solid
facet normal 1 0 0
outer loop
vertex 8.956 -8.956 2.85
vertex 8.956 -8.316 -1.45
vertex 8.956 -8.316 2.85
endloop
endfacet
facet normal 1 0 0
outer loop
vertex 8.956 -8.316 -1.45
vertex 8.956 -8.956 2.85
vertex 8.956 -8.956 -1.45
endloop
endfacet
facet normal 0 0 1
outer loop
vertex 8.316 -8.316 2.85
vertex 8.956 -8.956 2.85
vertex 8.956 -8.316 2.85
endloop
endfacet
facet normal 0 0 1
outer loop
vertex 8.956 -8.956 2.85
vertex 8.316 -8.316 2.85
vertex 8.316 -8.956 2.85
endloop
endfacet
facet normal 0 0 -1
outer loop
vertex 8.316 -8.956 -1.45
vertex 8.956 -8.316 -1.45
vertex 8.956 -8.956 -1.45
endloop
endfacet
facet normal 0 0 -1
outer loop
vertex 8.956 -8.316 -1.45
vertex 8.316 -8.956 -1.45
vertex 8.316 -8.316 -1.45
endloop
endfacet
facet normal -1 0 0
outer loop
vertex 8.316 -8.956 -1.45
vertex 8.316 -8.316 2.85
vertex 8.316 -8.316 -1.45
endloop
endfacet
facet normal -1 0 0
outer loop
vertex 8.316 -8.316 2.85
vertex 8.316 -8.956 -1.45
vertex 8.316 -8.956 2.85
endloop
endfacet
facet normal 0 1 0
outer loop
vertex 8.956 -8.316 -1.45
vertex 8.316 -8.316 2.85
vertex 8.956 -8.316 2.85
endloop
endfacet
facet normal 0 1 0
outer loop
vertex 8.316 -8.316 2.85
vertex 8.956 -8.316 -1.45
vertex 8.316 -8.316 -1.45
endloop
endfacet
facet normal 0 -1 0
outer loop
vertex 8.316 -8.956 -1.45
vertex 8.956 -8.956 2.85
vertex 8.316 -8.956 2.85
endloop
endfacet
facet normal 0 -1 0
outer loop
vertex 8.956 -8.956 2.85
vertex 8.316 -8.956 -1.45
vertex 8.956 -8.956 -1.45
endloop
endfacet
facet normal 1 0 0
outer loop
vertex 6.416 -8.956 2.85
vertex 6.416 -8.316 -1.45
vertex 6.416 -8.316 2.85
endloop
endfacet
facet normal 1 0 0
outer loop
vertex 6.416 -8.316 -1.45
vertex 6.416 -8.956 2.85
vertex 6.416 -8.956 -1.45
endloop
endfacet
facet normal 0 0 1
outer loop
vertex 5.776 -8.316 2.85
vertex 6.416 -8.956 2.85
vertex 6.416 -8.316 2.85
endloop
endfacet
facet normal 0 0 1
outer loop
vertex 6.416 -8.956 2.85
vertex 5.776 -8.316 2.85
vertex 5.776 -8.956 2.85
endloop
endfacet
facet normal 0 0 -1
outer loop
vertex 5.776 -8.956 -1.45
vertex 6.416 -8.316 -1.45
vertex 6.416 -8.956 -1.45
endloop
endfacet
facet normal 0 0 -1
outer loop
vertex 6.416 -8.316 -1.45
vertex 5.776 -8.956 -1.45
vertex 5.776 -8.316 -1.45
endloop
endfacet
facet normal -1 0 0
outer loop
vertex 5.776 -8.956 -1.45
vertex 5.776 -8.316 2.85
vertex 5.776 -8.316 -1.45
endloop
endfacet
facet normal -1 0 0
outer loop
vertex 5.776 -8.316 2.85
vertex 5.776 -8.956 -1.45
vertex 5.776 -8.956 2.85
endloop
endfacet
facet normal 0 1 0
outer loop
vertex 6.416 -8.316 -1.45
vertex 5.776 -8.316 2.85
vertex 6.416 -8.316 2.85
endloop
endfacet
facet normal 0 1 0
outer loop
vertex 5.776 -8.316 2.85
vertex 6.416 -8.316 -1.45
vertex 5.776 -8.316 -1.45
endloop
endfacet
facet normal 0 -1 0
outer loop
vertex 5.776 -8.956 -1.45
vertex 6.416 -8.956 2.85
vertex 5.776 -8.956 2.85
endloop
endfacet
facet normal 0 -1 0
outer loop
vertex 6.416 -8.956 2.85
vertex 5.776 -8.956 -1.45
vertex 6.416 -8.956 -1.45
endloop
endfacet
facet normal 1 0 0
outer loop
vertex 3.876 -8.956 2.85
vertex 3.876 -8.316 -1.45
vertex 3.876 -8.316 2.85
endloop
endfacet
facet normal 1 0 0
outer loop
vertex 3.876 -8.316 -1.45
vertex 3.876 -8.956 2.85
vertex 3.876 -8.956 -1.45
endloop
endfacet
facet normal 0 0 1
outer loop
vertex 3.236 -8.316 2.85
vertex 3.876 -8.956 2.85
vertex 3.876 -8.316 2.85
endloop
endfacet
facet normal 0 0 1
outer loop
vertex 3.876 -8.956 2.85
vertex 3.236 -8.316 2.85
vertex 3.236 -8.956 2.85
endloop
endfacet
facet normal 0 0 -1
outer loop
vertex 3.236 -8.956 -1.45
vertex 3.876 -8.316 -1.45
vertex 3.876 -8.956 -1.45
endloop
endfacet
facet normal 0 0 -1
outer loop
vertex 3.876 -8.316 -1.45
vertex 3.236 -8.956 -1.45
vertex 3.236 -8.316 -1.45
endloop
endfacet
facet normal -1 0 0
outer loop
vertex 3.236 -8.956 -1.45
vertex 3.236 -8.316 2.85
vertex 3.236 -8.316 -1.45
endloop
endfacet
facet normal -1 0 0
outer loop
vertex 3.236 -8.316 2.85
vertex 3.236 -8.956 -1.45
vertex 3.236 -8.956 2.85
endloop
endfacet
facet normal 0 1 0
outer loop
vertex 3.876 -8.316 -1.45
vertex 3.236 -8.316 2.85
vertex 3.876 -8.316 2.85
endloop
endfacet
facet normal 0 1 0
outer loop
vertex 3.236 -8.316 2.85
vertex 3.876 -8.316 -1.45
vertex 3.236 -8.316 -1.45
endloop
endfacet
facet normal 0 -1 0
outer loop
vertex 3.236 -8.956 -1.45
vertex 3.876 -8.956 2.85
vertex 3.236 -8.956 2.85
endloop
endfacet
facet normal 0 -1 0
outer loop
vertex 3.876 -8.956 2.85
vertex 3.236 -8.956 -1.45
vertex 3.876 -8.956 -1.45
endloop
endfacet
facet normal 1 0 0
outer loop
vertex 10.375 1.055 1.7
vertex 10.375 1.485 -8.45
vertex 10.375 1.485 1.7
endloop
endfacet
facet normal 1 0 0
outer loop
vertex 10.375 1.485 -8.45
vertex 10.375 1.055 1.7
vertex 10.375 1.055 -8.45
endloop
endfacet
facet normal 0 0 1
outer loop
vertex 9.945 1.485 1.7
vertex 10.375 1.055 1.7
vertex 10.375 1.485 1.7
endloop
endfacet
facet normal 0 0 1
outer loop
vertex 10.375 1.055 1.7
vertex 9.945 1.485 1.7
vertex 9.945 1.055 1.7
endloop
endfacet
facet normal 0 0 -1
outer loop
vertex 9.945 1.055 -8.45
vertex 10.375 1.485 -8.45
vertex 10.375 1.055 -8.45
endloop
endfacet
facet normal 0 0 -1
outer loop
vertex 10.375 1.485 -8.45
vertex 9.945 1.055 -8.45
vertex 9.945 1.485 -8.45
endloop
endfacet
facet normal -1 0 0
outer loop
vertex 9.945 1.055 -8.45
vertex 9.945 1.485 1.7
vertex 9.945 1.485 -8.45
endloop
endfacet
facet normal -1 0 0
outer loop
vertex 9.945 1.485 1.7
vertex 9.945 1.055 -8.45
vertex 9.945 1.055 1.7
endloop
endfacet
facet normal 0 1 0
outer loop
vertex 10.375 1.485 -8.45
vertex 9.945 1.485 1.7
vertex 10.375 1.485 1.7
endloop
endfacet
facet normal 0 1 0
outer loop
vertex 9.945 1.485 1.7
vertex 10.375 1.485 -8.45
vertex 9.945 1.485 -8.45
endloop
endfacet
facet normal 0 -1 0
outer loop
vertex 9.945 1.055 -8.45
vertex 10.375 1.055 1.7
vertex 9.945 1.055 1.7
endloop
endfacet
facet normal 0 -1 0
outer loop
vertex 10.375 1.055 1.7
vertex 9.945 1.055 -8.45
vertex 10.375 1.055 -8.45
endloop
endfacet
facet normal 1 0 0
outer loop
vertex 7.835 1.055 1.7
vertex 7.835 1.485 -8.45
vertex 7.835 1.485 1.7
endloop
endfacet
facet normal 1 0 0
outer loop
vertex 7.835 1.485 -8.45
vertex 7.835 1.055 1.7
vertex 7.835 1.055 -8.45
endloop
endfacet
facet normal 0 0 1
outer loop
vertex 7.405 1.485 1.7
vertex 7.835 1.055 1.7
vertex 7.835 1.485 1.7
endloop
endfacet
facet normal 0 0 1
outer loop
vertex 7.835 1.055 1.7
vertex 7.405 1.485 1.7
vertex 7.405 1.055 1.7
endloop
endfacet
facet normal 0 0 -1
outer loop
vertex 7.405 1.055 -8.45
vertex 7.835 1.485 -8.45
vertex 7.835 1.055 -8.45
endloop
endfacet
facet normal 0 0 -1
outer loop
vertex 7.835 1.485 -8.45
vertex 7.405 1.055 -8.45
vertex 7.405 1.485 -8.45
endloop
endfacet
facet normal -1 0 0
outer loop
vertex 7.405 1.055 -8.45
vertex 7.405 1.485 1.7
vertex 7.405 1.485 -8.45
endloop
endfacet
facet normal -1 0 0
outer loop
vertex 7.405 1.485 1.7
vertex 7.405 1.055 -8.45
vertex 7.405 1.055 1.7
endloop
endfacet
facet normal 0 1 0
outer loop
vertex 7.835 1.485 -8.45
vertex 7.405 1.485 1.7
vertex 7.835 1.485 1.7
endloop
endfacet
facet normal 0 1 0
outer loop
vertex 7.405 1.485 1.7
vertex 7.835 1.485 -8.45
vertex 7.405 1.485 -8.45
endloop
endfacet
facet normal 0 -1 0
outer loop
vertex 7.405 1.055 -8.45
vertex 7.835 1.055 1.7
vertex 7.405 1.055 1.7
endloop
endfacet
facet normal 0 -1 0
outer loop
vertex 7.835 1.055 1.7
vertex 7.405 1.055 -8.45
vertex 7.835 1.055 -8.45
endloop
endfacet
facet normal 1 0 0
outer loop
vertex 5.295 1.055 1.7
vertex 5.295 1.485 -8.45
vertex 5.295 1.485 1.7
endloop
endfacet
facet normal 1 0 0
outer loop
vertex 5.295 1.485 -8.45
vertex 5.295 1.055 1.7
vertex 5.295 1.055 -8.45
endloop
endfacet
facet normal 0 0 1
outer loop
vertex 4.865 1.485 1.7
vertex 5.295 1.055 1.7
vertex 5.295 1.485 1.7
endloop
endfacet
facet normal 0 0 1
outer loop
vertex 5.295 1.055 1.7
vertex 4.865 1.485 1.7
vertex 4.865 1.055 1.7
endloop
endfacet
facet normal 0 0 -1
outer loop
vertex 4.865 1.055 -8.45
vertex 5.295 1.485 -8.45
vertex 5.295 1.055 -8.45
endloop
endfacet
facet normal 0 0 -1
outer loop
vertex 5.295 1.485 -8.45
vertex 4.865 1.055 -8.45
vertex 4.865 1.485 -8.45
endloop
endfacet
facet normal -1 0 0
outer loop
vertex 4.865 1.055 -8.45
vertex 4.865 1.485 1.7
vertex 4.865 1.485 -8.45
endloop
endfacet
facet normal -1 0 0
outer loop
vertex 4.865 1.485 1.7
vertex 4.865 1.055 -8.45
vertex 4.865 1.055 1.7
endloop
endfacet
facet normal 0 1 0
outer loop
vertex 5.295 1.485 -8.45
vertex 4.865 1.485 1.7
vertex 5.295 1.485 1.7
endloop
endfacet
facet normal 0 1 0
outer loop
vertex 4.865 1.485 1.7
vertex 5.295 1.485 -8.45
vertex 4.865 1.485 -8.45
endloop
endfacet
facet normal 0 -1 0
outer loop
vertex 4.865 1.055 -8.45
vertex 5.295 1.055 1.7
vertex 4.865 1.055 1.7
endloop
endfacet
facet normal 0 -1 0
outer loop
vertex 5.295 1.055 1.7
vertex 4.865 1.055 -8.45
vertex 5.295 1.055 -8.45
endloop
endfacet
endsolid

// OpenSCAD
// file: 801f8c8ad5252d830007bc8fb8f76d3168990c0b1102200be74383be07b724a8.scad
/*
   Copyright 2018 Scott Bezek and the splitflap contributors

   Licensed under the Apache License, Version 2.0 (the "License");
   you may not use this file except in compliance with the License.
   You may obtain a copy of the License at

       http://www.apache.org/licenses/LICENSE-2.0

   Unless required by applicable law or agreed to in writing, software
   distributed under the License is distributed on an "AS IS" BASIS,
   WITHOUT WARRANTIES OR CONDITIONS OF ANY KIND, either express or implied.
   See the License for the specific language governing permissions and
   limitations under the License.
*/

include <3a8aa1ee2c5f15af7c9a4d3d95d6786cd3b11c8e1af2661494beaac4b8dd79fa.scad>;

pcb_thickness = 1.6;
sensor_spool_distance = 0.70;  // distance from the sensor to the face of the spool

// From datasheet:
hall_effect_height = (2.8 + 3.2) / 2;
hall_effect_width = (3.9 + 4.3) / 2;
hall_effect_thickness = (1.40 + 1.60) / 2;
hall_effect_sensor_offset_y = hall_effect_height - 1.25;
hall_effect_pin_length_max = 14.5;

// From sensor.kicad_pcb:
pcb_height = 16.256;
pcb_length = 16.256;
pcb_hole_to_sensor_pin_1_x = 10.16;
pcb_hole_to_sensor_pin_1_y = 1.27;
sensor_pin_pitch = 2.54;
pcb_hole_to_connector_pin_1_x = 8.636;
pcb_hole_to_connector_pin_1_y = 8.636;
connector_pin_pitch = 2.54;
pcb_edge_to_hole_x = 4.572;
pcb_edge_to_hole_y = 4.572;

pcb_adjustment_range = 4;
pcb_hole_radius = m4_hole_diameter/2;

// Jig dimensions
pcb_jig_corner_fillet = 2;
pcb_jig_align_thickness = 2;
pcb_jig_align_length = 0;  // past the PCB thickness
pcb_jig_align_clearance = 0.25;  // on x, around the PCB
pcb_jig_depth_clearance = 0.1;  // on y, from sensor to jig


// Computed dimensions
pcb_hole_to_sensor_x = pcb_hole_to_sensor_pin_1_x - sensor_pin_pitch;
pcb_hole_to_sensor_y = pcb_hole_to_sensor_pin_1_y + hall_effect_sensor_offset_y;


// Rough numbers for 3d rendering only (non-critical dimensions)
pcb_connector_height = 3.2;
pcb_connector_width = 8.2;
pcb_connector_length = 18;
pcb_connector_pin_width = 0.64;
pcb_connector_pin_slop = 0.4;
pcb_connector_pin_tail_length = 3.05 + 2.5/2;

pcb_sensor_pin_width = 0.43;

        module color_selector(c) {
            precision = 0.0000001;  // arbitrary
            function compare_floats(x, y, i=0) = 
                  (len(x) != len(y)) ? false  // if arrays differ in length, they can't be equal
                : (i >= len(x)) ? true  // if we've hit the end of the arrays without issue, we're equal
                : (x[i] - precision <= y[i]) && x[i] + precision >= y[i]
                    ? compare_floats(x, y, i+1)
                    : false;  // not equal, short circuit

            if (c == [0.5, 0.5, 0.5] || compare_floats(c, [0.5, 0.5, 0.5]))
                children();
        }
                    
// file: 3a8aa1ee2c5f15af7c9a4d3d95d6786cd3b11c8e1af2661494beaac4b8dd79fa.scad
/*
   Copyright 2015-2018 Scott Bezek and the splitflap contributors

   Licensed under the Apache License, Version 2.0 (the "License");
   you may not use this file except in compliance with the License.
   You may obtain a copy of the License at

       http://www.apache.org/licenses/LICENSE-2.0

   Unless required by applicable law or agreed to in writing, software
   distributed under the License is distributed on an "AS IS" BASIS,
   WITHOUT WARRANTIES OR CONDITIONS OF ANY KIND, either express or implied.
   See the License for the specific language governing permissions and
   limitations under the License.
*/

// M4 bolts
m4_hole_diameter = 4.5;
m4_bolt_length = 10;
m4_button_head_diameter = 7.6 + .2;
m4_button_head_length = 2.2 + .2;
m4_nut_width_flats = 7 + .2;
m4_nut_width_corners = 7/cos(180/6);
m4_nut_width_corners_padded = m4_nut_width_corners + .2;
m4_nut_length = 3.2;
m4_nut_length_padded = m4_nut_length + .2;


        module color_selector(c) {
            precision = 0.0000001;  // arbitrary
            function compare_floats(x, y, i=0) = 
                  (len(x) != len(y)) ? false  // if arrays differ in length, they can't be equal
                : (i >= len(x)) ? true  // if we've hit the end of the arrays without issue, we're equal
                : (x[i] - precision <= y[i]) && x[i] + precision >= y[i]
                    ? compare_floats(x, y, i+1)
                    : false;  // not equal, short circuit

            if (c == [0.5, 0.5, 0.5] || compare_floats(c, [0.5, 0.5, 0.5]))
                children();
        }
                    
// main file
/*
   Copyright 2015-2018 Scott Bezek and the splitflap contributors

   Licensed under the Apache License, Version 2.0 (the "License");
   you may not use this file except in compliance with the License.
   You may obtain a copy of the License at

       http://www.apache.org/licenses/LICENSE-2.0

   Unless required by applicable law or agreed to in writing, software
   distributed under the License is distributed on an "AS IS" BASIS,
   WITHOUT WARRANTIES OR CONDITIONS OF ANY KIND, either express or implied.
   See the License for the specific language governing permissions and
   limitations under the License.
*/
include <3a8aa1ee2c5f15af7c9a4d3d95d6786cd3b11c8e1af2661494beaac4b8dd79fa.scad>;
include <801f8c8ad5252d830007bc8fb8f76d3168990c0b1102200be74383be07b724a8.scad>;


module pcb_outline_2d(hole=true) {
    difference() {
        translate([-pcb_edge_to_hole_x, -pcb_height + pcb_edge_to_hole_y]) {
            square([pcb_length, pcb_height]);
        }
        if(hole) {
            circle(r=m4_hole_diameter/2, $fn=30);
        }
    }
}

// 3D PCB module, origin at the center of the mounting hole on the bottom surface of the PCB
module pcb(pcb_to_spool, render_jig=false, jig_thickness=0) {
     color_selector([0, 0.5, 0]) {
        linear_extrude(height=pcb_thickness) {
            pcb_outline_2d();
        }
    }

    // Connector
     color_selector([0, 0, 0]) {
        translate([pcb_hole_to_connector_pin_1_x - connector_pin_pitch - pcb_connector_width/2, -pcb_hole_to_connector_pin_1_y - pcb_connector_length, pcb_thickness]) {
            cube([pcb_connector_width, pcb_connector_length, pcb_connector_height]);
        }
    }

    // Connector pins
     color_selector([0.5, 0.5, 0.5]) {
        translate([pcb_hole_to_connector_pin_1_x - pcb_connector_pin_width/2, -pcb_hole_to_connector_pin_1_y - pcb_connector_pin_width/2, -pcb_connector_pin_tail_length + pcb_thickness + 2.5/2]) {
            cube([pcb_connector_pin_width, pcb_connector_pin_width, pcb_connector_pin_tail_length]);
            translate([-connector_pin_pitch, 0, 0]) {
                cube([pcb_connector_pin_width, pcb_connector_pin_width, pcb_connector_pin_tail_length]);
            }
            translate([-connector_pin_pitch * 2, 0, 0]) {
                cube([pcb_connector_pin_width, pcb_connector_pin_width, pcb_connector_pin_tail_length]);
            }
        }
    }

    // Sensor pins
     color_selector([0.5, 0.5, 0.5]) {
        pin_extra_length = 0.1;  // pins excess sticking out from the back of the PCB
        sensor_z_offset = pcb_to_spool - sensor_spool_distance - hall_effect_thickness/2 - 0.1;
        sensor_pin_length = sensor_z_offset + pcb_thickness + pin_extra_length;
        assert(sensor_pin_length < hall_effect_pin_length_max, "Warning: design is too thick to fit sensor");

        translate([pcb_hole_to_sensor_pin_1_x - pcb_sensor_pin_width/2, pcb_hole_to_sensor_pin_1_y - pcb_sensor_pin_width/2, -sensor_z_offset]) {
            cube([pcb_sensor_pin_width, pcb_sensor_pin_width, sensor_pin_length]);
            translate([-sensor_pin_pitch, 0, 0]) {
                cube([pcb_sensor_pin_width, pcb_sensor_pin_width, sensor_pin_length]);
            }
            translate([-sensor_pin_pitch * 2, 0, 0]) {
                cube([pcb_sensor_pin_width, pcb_sensor_pin_width, sensor_pin_length]);
            }
        }
    }

    // Sensor body
     color_selector([0, 0, 0]) {
        translate([pcb_hole_to_sensor_pin_1_x - sensor_pin_pitch - hall_effect_width/2, pcb_hole_to_sensor_pin_1_y, -pcb_to_spool + sensor_spool_distance]) {
            cube([hall_effect_width, hall_effect_height, hall_effect_thickness]);
        }
    }

    // Jig
    if(render_jig) {
         color_selector([1, 1, 0])
        translate([-pcb_edge_to_hole_x - pcb_jig_align_thickness - pcb_jig_align_clearance, pcb_hole_to_sensor_pin_1_y + pcb_sensor_pin_width/2 + thickness, -pcb_to_sensor(pcb_to_spool) + pcb_jig_depth_clearance])
        rotate([90, 0, 0])
            sensor_jig(pcb_to_spool, jig_thickness);
    }
}

// 2D cutouts needed to mount the PCB module, origin at the center of the mounting hole
module pcb_cutouts(adjustment_range=pcb_adjustment_range) {
    hull_slide(delta=adjustment_range) {
        // Bolt slot
        hull() {
            circle(r=m4_hole_diameter/2, $fn=30);
            translate([pcb_hole_to_sensor_pin_1_x + sensor_pin_pitch - m4_hole_diameter/2, 0, 0])
                circle(r=m4_hole_diameter/2, $fn=30);
        }
        // Pin header slot
        translate([pcb_hole_to_connector_pin_1_x - connector_pin_pitch, -pcb_hole_to_connector_pin_1_y]) {
            hull() {
                pin_slot_height = pcb_connector_pin_width + pcb_connector_pin_slop;
                pin_slot_width = connector_pin_pitch * 4 - pin_slot_height;
                translate([pin_slot_width/2, 0, 0])
                    circle(pin_slot_height/2, $fn=15);
                translate([-pin_slot_width/2, 0, 0])
                    circle(pin_slot_height/2, $fn=15);
            }
        }
    }
}

module hull_slide(delta) {
    for (i = [0:$children - 1]) {
        hull() {
            translate([-delta, 0]) {
                children(i);
            }
            translate([delta, 0]) {
                children(i);
            }
        }
    }
}

function pcb_to_sensor(pcb_to_spool) = pcb_to_spool - sensor_spool_distance - hall_effect_thickness;  // using sensor rear face
function pcb_hole_to_sensor_x() = pcb_hole_to_sensor_x;
function pcb_hole_to_sensor_y() = pcb_hole_to_sensor_y;
function pcb_thickness() = pcb_thickness;
function sensor_jig_height(pcb_to_spool) = pcb_to_sensor(pcb_to_spool) - pcb_jig_depth_clearance + pcb_jig_align_length + pcb_thickness;
function sensor_jig_width(pcb_to_spool) = pcb_length + (pcb_jig_align_thickness + pcb_jig_align_clearance) * 2;

module sensor_jig(pcb_to_spool, thickness) {
    module fillet() {
        eps = 0.01;
        difference() {
            translate([-eps, -eps, 0])
                square(pcb_jig_corner_fillet + eps);
            translate([pcb_jig_corner_fillet, pcb_jig_corner_fillet, 0])
                circle(r=pcb_jig_corner_fillet, $fn=20);
        }
    }

    linear_extrude(thickness) {
        difference() {
        union() {
            square([sensor_jig_width(pcb_to_spool), pcb_to_sensor(pcb_to_spool) - pcb_jig_depth_clearance]);  // main body
            square([pcb_jig_align_thickness, sensor_jig_height(pcb_to_spool)]);  // alignment edge, left
            translate([sensor_jig_width(pcb_to_spool) - pcb_jig_align_thickness, 0])
            square([pcb_jig_align_thickness, sensor_jig_height(pcb_to_spool)]);  // alignment edge, right
        }
        fillet();
        mirror([1, 0, 0])
            translate([-sensor_jig_width(pcb_to_spool), 0, 0])
                fillet();
        }
    }
}

// Example usage:
pcb(10);

        module color_selector(c) {
            precision = 0.0000001;  // arbitrary
            function compare_floats(x, y, i=0) = 
                  (len(x) != len(y)) ? false  // if arrays differ in length, they can't be equal
                : (i >= len(x)) ? true  // if we've hit the end of the arrays without issue, we're equal
                : (x[i] - precision <= y[i]) && x[i] + precision >= y[i]
                    ? compare_floats(x, y, i+1)
                    : false;  // not equal, short circuit

            if (c == [0.5, 0.5, 0.5] || compare_floats(c, [0.5, 0.5, 0.5]))
                children();
        }
                    
